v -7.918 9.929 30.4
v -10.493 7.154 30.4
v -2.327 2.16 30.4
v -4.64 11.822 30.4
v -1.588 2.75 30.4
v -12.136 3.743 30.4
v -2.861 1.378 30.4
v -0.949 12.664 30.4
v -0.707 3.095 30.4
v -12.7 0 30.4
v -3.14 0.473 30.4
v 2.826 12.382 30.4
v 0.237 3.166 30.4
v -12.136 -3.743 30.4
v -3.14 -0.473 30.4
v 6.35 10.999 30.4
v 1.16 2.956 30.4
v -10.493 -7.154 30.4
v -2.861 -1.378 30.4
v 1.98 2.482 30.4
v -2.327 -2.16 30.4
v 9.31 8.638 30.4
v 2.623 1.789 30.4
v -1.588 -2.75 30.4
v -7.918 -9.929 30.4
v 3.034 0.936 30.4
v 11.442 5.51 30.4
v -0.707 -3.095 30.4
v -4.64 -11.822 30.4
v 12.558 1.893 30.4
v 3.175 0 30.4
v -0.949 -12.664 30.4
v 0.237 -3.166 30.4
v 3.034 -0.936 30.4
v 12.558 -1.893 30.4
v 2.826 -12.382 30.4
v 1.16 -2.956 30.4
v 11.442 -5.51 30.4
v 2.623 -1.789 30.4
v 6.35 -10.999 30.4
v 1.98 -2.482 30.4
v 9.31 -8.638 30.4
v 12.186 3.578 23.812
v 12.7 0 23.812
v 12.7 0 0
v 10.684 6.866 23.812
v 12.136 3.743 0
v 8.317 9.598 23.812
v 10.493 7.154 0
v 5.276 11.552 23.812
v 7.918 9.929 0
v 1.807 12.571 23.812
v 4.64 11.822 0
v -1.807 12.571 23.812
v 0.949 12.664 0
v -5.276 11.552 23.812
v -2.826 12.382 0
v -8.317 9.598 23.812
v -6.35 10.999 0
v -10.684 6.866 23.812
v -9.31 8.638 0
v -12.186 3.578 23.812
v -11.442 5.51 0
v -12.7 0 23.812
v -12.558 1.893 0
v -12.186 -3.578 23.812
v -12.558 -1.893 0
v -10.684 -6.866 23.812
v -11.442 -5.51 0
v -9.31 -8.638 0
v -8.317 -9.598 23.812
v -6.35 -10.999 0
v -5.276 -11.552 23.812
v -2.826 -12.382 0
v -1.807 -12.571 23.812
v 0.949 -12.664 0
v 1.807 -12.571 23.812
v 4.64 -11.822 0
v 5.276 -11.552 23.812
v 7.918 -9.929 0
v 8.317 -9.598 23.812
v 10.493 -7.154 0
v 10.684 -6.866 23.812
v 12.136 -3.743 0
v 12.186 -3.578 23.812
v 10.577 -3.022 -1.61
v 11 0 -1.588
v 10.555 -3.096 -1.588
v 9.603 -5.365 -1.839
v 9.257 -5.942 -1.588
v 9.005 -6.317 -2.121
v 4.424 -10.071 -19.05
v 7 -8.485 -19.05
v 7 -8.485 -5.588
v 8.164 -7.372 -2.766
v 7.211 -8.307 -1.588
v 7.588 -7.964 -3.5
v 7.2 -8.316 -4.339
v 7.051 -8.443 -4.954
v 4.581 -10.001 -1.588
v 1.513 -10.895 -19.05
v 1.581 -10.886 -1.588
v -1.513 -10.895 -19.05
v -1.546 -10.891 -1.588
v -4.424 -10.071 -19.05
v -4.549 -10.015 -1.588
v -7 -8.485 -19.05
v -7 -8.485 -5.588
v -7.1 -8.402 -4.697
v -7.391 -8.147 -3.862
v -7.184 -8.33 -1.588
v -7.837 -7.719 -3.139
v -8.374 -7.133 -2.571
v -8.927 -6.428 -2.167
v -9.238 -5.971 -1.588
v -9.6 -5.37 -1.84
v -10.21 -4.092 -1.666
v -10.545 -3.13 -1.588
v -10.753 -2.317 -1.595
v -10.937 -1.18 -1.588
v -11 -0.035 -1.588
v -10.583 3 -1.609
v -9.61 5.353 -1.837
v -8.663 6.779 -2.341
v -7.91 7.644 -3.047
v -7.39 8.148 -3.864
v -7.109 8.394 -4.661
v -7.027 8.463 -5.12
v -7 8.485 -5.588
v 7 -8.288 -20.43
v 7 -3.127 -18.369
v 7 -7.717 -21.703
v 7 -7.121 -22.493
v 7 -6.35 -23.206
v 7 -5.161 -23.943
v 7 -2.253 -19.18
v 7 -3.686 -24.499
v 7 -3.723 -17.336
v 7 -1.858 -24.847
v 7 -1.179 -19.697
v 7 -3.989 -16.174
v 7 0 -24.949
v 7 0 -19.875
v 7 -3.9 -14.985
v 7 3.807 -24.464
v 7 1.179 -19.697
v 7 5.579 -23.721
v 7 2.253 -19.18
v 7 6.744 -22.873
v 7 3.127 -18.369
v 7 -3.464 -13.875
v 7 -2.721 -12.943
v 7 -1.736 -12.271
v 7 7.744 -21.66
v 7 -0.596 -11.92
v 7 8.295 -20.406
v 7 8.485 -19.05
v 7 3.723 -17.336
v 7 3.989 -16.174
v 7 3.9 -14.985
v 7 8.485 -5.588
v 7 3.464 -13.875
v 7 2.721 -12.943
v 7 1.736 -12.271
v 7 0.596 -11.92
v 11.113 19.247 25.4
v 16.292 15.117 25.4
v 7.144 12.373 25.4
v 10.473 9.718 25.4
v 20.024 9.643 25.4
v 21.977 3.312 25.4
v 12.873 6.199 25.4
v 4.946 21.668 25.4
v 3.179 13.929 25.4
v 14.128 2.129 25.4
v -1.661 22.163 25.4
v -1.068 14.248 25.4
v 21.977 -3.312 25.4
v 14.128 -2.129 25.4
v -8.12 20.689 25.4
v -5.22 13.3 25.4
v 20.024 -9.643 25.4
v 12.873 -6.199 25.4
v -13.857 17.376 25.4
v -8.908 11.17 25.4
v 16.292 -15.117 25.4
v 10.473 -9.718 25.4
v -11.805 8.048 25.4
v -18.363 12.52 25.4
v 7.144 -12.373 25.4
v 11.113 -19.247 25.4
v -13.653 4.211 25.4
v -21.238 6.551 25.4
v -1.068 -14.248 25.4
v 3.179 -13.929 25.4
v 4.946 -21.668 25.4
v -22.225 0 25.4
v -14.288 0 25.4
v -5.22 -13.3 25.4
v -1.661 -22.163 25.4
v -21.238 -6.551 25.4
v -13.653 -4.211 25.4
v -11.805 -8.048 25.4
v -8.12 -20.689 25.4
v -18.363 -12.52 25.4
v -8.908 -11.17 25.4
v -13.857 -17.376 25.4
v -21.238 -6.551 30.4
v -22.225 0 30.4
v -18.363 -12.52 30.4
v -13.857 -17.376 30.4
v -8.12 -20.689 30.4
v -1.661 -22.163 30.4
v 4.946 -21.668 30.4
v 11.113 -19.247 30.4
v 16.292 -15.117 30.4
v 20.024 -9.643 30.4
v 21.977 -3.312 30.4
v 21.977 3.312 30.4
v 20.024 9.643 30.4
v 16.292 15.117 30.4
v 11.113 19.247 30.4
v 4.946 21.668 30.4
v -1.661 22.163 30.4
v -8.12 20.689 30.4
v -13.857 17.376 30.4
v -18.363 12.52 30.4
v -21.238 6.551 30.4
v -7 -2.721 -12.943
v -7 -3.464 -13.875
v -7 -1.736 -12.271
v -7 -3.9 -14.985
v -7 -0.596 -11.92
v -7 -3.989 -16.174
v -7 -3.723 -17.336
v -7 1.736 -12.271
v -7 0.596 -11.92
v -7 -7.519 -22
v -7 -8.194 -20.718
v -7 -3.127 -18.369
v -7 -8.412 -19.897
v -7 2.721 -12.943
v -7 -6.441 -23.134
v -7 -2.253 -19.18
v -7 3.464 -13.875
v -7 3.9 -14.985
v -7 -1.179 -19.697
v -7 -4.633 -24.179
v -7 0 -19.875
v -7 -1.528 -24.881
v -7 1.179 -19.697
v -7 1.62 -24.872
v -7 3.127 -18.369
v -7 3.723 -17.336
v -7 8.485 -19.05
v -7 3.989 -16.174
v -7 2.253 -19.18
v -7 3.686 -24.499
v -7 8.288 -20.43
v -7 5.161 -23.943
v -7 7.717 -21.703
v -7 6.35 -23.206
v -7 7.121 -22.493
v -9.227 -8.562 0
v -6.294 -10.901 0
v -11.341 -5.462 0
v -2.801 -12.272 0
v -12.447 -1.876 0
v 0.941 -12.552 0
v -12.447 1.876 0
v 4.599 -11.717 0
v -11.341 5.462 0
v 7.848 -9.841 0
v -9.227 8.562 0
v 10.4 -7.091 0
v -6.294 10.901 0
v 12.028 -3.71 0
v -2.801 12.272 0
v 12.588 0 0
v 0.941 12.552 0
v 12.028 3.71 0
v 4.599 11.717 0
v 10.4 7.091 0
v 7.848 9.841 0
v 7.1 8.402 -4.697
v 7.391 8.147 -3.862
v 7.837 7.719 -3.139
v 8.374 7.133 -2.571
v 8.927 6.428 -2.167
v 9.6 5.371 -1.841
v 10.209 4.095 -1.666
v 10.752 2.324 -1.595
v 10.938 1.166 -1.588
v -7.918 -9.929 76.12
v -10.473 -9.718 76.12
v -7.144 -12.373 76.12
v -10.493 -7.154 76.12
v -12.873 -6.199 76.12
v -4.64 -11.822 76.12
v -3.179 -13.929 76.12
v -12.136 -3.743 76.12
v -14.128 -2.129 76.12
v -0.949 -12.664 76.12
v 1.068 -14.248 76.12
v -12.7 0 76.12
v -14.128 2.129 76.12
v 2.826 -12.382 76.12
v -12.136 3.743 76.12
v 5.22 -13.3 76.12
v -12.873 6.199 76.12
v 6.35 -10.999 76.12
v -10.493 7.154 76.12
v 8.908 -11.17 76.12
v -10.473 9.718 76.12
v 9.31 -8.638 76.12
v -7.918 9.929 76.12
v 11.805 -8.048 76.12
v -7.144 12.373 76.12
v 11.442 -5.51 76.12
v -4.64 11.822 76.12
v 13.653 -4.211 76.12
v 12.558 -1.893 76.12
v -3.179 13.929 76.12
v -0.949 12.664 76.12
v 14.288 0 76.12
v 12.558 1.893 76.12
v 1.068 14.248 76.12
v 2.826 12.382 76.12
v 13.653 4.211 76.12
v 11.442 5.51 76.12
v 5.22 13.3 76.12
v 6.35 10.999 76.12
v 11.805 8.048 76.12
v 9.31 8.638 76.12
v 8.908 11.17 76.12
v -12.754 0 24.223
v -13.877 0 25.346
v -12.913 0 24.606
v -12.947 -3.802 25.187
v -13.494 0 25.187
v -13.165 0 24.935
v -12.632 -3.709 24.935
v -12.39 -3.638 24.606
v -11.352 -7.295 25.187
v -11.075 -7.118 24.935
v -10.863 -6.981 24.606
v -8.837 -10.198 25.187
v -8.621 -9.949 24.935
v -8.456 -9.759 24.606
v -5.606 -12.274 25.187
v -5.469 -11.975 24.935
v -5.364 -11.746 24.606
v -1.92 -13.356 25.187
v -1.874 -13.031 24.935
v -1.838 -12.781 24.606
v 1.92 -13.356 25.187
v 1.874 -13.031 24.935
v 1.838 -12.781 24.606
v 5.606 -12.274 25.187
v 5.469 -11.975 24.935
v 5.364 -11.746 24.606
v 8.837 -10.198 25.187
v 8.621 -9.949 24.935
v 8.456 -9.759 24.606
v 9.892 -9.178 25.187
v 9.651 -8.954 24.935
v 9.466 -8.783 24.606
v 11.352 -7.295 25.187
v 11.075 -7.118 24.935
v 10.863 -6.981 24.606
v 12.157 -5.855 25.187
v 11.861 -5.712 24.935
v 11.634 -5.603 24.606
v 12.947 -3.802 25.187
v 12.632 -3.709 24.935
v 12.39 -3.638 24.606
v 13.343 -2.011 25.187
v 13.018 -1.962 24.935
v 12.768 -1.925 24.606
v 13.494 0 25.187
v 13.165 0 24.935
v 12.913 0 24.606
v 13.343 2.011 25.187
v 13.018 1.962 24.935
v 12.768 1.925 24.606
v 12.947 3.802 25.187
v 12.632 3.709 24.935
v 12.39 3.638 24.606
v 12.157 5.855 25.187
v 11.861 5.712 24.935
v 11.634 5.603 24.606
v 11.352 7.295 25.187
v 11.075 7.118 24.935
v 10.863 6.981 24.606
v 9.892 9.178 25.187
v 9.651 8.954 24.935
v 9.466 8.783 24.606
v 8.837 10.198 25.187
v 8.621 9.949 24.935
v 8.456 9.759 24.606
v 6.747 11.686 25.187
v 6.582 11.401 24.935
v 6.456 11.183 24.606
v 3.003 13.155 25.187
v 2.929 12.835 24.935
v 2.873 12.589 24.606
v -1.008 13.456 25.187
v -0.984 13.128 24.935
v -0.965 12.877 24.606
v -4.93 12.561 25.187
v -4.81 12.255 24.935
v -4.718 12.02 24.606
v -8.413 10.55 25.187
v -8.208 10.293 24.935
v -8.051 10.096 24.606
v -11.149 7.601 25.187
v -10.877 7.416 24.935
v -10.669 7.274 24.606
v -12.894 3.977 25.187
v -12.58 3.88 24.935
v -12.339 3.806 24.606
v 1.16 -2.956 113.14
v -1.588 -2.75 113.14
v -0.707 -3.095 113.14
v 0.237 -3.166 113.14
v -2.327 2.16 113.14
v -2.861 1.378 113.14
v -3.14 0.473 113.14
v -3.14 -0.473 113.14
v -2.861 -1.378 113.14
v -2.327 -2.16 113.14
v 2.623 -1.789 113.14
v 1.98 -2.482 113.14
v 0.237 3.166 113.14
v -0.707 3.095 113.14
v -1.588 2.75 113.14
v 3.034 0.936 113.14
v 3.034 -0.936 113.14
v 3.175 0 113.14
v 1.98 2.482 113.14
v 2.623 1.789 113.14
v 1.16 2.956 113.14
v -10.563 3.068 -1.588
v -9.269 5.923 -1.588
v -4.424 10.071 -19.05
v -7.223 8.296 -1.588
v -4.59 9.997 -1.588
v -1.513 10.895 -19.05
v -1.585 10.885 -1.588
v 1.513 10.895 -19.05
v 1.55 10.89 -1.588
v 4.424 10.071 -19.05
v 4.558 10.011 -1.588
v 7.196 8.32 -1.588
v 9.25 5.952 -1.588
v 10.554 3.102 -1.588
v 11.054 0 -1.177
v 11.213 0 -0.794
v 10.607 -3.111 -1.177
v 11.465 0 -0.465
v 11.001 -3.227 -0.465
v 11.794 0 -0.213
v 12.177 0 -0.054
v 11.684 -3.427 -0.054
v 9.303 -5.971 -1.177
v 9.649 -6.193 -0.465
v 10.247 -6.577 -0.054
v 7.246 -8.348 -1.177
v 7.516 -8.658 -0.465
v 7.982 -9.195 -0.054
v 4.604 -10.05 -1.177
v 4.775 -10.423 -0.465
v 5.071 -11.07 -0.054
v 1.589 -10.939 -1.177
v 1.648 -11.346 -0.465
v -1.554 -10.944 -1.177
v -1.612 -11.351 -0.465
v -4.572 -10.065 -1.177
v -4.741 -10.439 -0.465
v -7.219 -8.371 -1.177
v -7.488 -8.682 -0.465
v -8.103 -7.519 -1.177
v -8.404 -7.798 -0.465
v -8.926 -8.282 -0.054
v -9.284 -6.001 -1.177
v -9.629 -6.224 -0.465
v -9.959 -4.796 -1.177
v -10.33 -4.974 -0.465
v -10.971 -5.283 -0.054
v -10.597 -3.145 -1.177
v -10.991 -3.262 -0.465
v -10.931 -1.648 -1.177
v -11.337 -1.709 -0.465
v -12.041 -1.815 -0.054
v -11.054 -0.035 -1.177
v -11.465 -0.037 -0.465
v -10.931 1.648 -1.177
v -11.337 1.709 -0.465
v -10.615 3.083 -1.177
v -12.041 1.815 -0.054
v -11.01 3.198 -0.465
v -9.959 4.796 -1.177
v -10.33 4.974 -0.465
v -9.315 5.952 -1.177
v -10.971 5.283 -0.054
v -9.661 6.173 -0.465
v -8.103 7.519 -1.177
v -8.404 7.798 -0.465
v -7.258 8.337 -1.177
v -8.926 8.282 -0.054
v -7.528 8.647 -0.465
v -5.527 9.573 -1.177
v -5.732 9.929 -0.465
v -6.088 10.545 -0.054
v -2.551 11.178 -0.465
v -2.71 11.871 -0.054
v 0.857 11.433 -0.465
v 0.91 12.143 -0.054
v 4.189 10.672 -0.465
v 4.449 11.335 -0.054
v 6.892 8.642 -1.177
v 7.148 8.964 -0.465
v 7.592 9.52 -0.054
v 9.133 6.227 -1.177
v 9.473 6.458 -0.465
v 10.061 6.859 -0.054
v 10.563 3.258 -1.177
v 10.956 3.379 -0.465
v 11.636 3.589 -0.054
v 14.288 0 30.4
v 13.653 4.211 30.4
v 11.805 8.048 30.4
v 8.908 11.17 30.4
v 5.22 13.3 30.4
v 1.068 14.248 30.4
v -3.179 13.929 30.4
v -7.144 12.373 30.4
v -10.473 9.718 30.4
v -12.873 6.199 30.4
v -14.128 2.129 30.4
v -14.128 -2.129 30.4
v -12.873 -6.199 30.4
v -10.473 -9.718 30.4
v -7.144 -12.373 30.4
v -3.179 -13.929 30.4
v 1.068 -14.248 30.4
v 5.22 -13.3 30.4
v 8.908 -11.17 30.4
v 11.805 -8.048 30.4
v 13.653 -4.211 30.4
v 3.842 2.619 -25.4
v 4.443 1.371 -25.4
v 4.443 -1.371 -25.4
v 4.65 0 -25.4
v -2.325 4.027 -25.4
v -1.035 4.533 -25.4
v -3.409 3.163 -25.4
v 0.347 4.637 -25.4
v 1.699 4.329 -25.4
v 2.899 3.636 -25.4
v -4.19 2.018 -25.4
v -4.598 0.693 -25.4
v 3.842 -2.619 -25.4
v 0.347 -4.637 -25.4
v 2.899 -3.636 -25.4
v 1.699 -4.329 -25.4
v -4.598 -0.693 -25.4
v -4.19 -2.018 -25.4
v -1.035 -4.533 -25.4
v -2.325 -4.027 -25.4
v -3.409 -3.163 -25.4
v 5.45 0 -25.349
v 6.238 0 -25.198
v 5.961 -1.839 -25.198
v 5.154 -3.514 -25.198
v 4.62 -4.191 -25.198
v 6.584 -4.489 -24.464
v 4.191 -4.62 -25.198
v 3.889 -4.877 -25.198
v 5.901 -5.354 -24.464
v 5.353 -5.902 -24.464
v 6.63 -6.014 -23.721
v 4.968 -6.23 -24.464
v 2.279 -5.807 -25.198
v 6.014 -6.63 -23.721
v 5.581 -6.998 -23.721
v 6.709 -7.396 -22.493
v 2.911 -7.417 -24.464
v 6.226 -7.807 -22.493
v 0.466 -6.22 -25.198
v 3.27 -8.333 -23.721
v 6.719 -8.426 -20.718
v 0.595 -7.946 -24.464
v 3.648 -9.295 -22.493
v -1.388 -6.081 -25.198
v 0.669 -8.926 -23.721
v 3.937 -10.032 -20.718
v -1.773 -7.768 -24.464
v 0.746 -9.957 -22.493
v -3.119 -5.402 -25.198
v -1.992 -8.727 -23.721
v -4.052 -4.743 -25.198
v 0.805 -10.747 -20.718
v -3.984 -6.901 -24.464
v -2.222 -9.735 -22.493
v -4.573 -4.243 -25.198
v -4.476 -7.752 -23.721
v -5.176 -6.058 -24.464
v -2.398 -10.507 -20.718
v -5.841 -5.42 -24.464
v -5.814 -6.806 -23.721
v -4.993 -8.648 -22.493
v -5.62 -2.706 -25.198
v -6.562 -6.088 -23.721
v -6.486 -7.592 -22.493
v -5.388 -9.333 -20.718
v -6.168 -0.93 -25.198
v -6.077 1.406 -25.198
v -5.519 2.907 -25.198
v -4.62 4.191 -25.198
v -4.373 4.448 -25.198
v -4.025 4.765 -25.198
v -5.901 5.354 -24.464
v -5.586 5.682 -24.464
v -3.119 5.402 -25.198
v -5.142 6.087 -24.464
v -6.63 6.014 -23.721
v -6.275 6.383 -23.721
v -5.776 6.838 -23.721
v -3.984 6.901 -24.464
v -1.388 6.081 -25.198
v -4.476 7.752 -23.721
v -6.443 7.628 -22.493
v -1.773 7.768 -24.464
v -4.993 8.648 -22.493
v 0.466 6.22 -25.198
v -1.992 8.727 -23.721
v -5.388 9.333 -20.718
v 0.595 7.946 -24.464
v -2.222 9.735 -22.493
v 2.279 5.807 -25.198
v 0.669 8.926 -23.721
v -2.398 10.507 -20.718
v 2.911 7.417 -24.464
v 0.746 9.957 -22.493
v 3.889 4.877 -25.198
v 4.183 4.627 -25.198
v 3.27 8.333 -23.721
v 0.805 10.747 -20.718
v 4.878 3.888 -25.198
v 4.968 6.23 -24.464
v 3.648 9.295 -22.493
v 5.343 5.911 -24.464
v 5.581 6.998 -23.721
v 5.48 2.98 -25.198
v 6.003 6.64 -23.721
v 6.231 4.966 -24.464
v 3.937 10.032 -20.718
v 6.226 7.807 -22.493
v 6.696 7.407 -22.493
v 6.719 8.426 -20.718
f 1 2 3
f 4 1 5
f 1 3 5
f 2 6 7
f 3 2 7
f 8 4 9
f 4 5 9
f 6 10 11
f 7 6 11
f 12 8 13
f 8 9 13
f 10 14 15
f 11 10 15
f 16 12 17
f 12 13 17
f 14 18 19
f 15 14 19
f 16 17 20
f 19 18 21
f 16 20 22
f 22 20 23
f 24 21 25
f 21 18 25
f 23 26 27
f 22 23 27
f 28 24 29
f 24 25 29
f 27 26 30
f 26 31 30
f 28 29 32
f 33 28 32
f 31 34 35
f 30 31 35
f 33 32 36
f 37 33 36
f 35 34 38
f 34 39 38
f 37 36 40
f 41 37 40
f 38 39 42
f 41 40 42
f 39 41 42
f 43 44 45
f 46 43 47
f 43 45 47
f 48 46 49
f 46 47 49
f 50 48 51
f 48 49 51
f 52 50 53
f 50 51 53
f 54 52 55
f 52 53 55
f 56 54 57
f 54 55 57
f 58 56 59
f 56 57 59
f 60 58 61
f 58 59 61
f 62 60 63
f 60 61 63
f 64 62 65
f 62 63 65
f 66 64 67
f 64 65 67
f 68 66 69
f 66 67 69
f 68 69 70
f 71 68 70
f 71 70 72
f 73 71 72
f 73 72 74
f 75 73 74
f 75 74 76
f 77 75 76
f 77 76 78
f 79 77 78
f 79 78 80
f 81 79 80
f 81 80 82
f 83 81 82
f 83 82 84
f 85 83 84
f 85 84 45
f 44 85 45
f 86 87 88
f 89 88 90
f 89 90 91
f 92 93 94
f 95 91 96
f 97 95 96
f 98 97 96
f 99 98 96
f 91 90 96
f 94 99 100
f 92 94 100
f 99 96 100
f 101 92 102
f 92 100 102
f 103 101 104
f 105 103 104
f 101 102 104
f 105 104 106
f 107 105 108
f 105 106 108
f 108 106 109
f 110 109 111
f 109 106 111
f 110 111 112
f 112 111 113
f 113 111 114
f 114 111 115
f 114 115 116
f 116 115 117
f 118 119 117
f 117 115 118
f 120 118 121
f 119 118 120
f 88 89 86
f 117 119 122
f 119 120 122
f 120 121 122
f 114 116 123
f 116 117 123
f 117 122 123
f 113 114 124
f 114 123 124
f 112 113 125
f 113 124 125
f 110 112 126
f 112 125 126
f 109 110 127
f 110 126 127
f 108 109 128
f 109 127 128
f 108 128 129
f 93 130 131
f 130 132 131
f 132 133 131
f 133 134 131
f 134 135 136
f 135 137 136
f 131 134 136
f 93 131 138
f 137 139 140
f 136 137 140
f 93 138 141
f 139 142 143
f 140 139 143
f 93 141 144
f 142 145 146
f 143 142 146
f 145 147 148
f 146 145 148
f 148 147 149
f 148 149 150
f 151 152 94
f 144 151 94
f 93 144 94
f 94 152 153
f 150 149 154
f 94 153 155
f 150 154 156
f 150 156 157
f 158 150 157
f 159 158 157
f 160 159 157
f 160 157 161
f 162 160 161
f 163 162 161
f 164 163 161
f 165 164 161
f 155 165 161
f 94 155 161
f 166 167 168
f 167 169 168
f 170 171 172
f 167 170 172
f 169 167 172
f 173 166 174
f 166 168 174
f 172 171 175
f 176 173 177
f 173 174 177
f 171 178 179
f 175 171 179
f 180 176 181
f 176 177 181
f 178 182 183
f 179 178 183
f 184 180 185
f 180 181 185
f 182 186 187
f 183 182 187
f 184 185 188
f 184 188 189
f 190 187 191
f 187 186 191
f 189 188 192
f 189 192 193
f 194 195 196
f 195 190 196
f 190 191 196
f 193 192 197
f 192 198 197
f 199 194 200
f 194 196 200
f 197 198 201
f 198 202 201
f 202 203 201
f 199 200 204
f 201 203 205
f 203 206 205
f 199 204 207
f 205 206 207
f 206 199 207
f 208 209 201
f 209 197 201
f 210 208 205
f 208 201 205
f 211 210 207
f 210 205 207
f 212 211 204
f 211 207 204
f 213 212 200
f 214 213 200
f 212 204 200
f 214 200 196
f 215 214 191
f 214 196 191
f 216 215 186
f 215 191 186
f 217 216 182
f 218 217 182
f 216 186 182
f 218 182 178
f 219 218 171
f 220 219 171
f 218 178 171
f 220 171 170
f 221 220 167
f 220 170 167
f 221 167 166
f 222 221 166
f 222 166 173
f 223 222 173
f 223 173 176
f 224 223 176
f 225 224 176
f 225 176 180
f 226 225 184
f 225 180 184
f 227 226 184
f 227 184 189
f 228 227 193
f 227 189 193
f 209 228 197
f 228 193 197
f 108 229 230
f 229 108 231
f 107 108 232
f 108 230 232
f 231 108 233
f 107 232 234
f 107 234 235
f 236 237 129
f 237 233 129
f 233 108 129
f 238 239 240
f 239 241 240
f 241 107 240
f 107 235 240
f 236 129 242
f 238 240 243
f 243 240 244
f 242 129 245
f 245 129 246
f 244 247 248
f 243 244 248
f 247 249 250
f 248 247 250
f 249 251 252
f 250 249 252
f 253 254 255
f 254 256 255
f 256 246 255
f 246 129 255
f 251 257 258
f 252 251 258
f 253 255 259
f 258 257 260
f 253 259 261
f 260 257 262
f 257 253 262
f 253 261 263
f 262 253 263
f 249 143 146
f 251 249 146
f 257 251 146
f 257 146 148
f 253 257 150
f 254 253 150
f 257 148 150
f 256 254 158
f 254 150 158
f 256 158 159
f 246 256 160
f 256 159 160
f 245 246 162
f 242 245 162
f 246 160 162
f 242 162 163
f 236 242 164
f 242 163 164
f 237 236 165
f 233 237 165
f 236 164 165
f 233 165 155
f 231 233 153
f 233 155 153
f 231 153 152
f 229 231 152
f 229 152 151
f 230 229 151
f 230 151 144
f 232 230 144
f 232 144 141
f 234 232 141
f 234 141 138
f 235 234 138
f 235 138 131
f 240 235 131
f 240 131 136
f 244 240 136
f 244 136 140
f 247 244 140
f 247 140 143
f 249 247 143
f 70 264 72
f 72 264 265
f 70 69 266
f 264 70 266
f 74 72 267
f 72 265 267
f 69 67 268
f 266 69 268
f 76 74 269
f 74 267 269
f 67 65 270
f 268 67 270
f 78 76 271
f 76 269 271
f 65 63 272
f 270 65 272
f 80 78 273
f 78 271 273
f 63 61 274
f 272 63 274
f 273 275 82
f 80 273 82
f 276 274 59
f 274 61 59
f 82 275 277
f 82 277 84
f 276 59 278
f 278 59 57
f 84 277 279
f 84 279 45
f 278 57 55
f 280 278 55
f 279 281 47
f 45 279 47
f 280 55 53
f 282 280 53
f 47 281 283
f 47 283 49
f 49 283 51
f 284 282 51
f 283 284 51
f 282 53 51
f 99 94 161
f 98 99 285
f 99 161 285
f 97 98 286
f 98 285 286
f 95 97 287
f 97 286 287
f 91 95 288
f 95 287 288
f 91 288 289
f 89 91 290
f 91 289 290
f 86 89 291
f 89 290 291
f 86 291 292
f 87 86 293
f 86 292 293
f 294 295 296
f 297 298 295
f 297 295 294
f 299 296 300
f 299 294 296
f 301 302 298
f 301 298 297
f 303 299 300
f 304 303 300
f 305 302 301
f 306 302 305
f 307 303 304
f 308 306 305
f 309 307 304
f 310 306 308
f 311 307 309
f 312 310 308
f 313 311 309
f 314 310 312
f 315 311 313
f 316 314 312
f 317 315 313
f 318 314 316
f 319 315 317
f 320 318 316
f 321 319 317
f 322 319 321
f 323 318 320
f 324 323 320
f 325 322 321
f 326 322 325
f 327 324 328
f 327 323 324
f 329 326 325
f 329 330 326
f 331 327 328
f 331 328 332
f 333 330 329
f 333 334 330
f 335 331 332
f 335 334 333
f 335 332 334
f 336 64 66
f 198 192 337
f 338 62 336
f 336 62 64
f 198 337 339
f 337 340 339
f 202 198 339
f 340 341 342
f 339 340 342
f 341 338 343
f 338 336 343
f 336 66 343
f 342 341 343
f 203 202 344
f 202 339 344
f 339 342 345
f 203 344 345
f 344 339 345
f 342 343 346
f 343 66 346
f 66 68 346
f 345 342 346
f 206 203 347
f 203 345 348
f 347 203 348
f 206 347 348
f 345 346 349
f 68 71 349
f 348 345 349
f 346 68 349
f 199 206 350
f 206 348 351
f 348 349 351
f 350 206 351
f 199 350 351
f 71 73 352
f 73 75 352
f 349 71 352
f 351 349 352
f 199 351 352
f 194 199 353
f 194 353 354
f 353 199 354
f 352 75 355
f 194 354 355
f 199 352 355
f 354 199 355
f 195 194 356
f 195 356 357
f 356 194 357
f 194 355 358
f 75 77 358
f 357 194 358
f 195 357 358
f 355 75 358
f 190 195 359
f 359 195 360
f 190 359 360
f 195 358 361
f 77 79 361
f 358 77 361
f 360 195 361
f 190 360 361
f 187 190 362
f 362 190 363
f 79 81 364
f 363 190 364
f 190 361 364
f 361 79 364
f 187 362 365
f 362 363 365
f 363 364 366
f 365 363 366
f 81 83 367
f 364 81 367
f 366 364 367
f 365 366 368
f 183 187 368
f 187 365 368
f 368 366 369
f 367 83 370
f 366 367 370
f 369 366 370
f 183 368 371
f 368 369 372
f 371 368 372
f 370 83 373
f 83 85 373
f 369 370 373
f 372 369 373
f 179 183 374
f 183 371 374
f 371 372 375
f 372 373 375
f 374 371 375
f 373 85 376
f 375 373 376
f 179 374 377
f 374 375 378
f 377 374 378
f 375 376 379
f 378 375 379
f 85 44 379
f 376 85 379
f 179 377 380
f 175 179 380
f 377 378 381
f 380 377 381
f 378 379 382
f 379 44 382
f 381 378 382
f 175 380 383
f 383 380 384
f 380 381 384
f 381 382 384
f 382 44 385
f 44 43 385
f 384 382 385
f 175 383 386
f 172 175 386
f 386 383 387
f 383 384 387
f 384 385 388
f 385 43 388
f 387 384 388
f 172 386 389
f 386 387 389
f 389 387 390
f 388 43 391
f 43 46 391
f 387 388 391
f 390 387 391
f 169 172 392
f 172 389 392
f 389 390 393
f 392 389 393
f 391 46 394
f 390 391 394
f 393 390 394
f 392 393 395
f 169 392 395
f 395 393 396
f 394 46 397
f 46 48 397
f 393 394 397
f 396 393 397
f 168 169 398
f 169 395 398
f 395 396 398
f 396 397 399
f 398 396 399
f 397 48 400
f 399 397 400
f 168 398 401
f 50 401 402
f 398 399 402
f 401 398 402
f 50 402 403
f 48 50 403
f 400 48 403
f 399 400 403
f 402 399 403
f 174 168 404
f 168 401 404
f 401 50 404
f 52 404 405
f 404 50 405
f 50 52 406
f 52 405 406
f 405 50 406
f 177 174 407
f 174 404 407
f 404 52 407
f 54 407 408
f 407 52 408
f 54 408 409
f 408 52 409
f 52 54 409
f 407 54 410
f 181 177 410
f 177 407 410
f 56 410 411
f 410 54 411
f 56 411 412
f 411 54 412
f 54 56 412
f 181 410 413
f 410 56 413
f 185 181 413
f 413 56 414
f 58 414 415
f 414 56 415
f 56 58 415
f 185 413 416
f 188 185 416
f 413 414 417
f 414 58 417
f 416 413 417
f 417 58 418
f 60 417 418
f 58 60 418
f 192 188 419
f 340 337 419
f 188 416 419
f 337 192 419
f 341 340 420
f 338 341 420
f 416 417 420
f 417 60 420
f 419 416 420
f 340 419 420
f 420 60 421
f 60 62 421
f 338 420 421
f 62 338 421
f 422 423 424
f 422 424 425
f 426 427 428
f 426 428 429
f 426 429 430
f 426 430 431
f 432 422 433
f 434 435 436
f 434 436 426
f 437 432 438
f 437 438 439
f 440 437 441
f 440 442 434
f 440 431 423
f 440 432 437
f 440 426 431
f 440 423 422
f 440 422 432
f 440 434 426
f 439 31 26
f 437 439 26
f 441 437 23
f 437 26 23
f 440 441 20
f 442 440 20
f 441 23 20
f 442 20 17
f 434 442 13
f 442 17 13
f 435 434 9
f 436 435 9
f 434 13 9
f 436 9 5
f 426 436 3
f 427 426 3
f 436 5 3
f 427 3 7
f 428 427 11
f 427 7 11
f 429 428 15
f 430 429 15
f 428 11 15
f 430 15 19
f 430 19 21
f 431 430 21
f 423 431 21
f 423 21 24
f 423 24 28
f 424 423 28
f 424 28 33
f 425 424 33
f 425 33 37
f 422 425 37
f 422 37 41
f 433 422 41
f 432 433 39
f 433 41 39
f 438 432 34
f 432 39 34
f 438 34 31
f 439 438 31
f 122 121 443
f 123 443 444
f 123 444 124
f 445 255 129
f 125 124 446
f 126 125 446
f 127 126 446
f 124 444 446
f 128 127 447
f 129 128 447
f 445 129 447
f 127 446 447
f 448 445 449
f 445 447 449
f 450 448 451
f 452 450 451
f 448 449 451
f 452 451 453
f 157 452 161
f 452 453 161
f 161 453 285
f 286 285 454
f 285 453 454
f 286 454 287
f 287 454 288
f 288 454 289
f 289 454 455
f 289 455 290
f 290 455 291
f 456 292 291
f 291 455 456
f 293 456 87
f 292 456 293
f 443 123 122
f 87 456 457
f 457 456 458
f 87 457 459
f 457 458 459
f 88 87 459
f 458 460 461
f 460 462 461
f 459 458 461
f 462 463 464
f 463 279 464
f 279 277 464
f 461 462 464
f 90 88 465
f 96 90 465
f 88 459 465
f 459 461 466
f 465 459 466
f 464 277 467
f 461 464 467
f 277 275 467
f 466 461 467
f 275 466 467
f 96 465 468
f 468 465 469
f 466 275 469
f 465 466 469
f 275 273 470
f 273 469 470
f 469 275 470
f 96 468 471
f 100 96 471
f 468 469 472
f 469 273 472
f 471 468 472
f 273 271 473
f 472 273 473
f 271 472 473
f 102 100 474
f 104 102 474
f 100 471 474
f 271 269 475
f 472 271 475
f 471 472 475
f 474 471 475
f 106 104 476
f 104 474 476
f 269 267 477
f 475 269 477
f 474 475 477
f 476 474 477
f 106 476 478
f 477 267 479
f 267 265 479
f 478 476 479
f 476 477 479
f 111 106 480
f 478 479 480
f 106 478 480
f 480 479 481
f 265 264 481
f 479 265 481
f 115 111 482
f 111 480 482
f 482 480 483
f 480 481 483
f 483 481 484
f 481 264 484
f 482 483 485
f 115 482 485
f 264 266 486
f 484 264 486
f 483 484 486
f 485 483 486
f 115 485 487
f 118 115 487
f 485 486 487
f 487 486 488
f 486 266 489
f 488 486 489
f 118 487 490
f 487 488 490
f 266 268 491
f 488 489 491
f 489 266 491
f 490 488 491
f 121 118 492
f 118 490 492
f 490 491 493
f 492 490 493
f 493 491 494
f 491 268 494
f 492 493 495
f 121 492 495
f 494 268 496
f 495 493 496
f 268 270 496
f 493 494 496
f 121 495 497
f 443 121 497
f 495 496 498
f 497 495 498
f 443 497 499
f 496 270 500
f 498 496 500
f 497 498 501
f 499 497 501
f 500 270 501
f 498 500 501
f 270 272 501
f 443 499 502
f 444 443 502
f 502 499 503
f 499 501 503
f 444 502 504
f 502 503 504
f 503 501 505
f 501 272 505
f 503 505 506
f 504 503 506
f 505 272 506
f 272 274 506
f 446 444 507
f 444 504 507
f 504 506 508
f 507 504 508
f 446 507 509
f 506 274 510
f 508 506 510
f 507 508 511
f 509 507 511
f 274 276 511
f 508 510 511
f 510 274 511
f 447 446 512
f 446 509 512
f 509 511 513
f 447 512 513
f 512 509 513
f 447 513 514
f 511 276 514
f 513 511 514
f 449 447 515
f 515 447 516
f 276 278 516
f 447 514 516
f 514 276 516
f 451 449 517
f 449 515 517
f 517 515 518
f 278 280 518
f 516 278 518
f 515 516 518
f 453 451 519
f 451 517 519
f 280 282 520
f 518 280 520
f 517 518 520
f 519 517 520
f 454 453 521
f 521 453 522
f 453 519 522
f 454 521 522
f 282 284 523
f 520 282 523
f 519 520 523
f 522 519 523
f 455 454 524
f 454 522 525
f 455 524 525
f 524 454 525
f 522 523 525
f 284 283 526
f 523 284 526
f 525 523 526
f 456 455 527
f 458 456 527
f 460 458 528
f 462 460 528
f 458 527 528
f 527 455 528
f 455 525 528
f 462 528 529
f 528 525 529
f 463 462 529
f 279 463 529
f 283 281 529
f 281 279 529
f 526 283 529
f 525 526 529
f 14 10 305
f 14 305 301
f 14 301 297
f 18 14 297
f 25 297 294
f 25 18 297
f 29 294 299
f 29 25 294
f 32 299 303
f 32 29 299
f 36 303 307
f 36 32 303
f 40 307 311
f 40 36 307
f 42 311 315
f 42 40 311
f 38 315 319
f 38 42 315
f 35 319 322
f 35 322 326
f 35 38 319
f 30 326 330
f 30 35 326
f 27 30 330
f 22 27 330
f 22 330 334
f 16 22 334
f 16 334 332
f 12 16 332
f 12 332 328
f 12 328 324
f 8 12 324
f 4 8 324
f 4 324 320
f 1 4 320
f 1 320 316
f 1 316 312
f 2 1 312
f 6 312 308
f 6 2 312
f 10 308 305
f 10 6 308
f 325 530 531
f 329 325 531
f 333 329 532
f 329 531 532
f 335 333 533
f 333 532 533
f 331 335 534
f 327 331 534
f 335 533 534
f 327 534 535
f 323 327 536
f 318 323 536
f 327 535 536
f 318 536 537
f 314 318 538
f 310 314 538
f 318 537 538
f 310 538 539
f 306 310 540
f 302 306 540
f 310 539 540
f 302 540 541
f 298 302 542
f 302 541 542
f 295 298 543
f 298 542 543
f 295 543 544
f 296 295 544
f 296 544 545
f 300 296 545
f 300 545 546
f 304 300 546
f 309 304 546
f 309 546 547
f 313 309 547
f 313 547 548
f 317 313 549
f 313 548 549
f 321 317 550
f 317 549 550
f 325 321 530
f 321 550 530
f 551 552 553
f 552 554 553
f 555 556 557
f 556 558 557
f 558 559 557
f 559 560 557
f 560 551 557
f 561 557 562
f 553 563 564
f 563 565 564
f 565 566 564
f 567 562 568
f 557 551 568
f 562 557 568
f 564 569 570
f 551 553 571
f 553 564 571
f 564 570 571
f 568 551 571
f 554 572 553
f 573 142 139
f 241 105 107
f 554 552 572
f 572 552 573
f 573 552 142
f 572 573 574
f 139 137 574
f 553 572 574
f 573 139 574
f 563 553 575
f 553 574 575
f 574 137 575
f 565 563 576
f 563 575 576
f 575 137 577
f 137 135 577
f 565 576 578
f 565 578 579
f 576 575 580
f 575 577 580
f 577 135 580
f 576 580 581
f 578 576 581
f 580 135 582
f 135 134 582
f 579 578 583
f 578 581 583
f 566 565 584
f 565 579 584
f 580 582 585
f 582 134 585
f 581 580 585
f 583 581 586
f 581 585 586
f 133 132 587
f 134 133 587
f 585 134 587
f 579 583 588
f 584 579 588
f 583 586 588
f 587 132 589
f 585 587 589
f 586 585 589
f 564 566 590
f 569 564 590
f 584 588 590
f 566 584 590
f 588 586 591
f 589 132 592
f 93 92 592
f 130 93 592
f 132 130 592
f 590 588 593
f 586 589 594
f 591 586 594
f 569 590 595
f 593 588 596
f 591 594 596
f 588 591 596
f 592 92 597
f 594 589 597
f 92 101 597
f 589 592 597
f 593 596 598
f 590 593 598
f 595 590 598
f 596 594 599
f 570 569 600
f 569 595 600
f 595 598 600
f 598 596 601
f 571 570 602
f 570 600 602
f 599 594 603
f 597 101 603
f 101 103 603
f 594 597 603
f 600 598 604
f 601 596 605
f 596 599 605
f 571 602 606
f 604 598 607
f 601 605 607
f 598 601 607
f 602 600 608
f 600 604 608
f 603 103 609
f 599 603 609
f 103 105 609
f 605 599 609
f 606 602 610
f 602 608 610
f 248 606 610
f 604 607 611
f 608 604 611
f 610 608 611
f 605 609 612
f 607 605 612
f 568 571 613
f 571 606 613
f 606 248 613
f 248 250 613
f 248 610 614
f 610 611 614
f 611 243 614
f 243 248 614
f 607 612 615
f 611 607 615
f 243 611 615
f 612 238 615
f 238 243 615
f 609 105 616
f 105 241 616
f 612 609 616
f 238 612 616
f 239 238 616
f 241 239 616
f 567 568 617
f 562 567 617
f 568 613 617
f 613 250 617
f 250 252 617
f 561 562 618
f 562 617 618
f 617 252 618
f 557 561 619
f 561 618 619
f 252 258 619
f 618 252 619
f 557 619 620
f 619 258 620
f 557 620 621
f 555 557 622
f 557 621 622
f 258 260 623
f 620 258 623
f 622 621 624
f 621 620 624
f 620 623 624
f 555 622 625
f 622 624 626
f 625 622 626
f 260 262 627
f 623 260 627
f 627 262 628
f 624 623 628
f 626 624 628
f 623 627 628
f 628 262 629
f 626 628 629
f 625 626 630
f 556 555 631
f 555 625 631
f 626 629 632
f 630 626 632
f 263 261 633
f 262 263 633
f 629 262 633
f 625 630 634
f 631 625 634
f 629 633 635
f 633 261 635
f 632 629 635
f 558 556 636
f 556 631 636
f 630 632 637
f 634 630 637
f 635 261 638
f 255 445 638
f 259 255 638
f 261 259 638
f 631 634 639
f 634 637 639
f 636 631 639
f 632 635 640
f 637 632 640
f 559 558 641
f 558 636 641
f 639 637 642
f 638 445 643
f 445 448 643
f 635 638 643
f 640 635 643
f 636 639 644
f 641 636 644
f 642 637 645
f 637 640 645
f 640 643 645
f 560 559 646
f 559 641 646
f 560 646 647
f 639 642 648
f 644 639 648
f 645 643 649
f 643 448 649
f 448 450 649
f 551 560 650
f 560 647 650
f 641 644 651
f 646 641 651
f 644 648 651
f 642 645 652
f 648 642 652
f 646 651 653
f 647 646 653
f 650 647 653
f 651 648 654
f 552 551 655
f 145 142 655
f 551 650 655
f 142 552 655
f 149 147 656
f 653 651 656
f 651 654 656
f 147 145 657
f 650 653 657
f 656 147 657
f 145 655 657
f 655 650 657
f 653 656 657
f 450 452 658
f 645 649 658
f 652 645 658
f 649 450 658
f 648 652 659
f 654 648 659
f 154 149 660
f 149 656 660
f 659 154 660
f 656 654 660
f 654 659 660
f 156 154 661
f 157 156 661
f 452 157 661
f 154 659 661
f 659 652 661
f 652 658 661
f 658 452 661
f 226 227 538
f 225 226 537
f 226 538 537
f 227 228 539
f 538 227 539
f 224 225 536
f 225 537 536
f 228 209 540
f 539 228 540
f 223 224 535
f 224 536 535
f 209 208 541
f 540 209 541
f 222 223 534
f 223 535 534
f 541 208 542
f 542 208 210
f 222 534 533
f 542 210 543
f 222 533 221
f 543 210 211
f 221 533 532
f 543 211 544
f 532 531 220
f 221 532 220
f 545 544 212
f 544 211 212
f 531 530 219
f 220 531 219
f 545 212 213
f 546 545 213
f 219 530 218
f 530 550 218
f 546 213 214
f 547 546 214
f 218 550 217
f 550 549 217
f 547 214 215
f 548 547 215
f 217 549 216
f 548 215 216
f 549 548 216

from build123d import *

# Parameters (mm, degrees)
SKETCH1_R           = 12.7
BOSS_EXTRUDE1_DEPTH = 25.4
CUT_EXTRUDE1_DEPTH  = 37.988376621
SKETCH6_R           = 4
CUT_EXTRUDE2_DEPTH  = 35.562118064
SKETCH8_R           = 14.2875
SKETCH8_R_2         = 12.7
BOSS_EXTRUDE2_DEPTH = 45.72
SKETCH9_R           = 3.175
BOSS_EXTRUDE3_DEPTH = 82.740000128


with BuildPart() as part:
    # Sketch1 → Boss-Extrude1 (new body)
    with BuildSketch(Plane.XY):
        Circle(SKETCH1_R)
    extrude(amount=BOSS_EXTRUDE1_DEPTH)

    # Sketch3 → Revolve1 (revolve)
    with BuildSketch(Plane(origin=(0, 0, 0), x_dir=(1, 0, 0), z_dir=(0, 1, 0))):
        with BuildLine():
            Line((12.5875, 0), (0, 0))
            Line((0, 0), (0, 25.4))
            Line((0, 25.4), (4.65, 25.4))
            ThreePointArc((4.65, 25.4), (9.140128061, 23.540128061), (11, 19.05))
            Line((11, 19.05), (11, 1.5875))
            ThreePointArc((11, 1.5875), (11.464967985, 0.464967985), (12.5875, 0))
        make_face()
    revolve(axis=Axis((0, 0, 0), (0, 0, -1)))

    # Sketch4 → Cut-Extrude1 (cut, through all)
    with BuildSketch(Plane(origin=(0, 11, 0), x_dir=(1, 0, 0), z_dir=(0, 1, 0))):
        with BuildLine():
            Line((-13.686249438, 25.4), (-13.686249438, 2.623707841))
            ThreePointArc((-13.686249438, 2.623707841), (-9.379043145, 1.930657253), (-7, 5.5875))
            Line((-7, 5.5875), (-7, 25.4))
            Line((-7, 25.4), (-13.686249438, 25.4))
        make_face()
        with BuildLine():
            Line((7, 25.4), (7, 5.5875))
            ThreePointArc((7, 5.5875), (9.379043145, 1.930657253), (13.686249438, 2.623707841))
            Line((13.686249438, 2.623707841), (13.686249438, 25.4))
            Line((13.686249438, 25.4), (7, 25.4))
        make_face()
    extrude(amount=-CUT_EXTRUDE1_DEPTH, mode=Mode.SUBTRACT)

    # Sketch6 → Cut-Extrude2 (cut, through all)
    with BuildSketch(Plane(origin=(7, 0, 0), x_dir=(0, 0, -1), z_dir=(1, 0, 0))):
        with Locations((15.875, 0)):
            Circle(SKETCH6_R)
    extrude(amount=-CUT_EXTRUDE2_DEPTH, mode=Mode.SUBTRACT)

    # Sketch7 → Revolve2 (revolve)
    with BuildSketch(Plane(origin=(0, 0, 0), x_dir=(1, 0, 0), z_dir=(0, 1, 0)), mode=Mode.PRIVATE) as revolve2_sk:
        with BuildLine():
            Line((12.7, -25.4), (0, -25.4))
            Line((0, -25.4), (0, -30.4))
            Line((0, -30.4), (22.225, -30.4))
            Line((22.225, -30.4), (22.225, -25.4))
            Line((22.225, -25.4), (14.2875, -25.4))
            ThreePointArc((14.2875, -25.4), (13.164967985, -24.935032015), (12.7, -23.8125))
            Line((12.7, -23.8125), (12.7, -25.4))
        make_face()
    revolve(revolve2_sk.sketch.rotate(Axis((0, 0, 25.4), (0, 0, 1)), 180), axis=Axis((0, 0, 25.4), (0, 0, 1)))

    # Sketch8 → Boss-Extrude2 (add)
    with BuildSketch(Plane.XY.offset(30.4)):
        Circle(SKETCH8_R)
        with Locations(Location((0, 0, 0), (0, 0, 180))):
            Circle(SKETCH8_R_2, mode=Mode.SUBTRACT)
    extrude(amount=BOSS_EXTRUDE2_DEPTH)

    # Sketch9 → Boss-Extrude3 (add)
    with BuildSketch(Plane.XY.offset(30.4)):
        Circle(SKETCH9_R)
    extrude(amount=BOSS_EXTRUDE3_DEPTH)


solid = part.part
